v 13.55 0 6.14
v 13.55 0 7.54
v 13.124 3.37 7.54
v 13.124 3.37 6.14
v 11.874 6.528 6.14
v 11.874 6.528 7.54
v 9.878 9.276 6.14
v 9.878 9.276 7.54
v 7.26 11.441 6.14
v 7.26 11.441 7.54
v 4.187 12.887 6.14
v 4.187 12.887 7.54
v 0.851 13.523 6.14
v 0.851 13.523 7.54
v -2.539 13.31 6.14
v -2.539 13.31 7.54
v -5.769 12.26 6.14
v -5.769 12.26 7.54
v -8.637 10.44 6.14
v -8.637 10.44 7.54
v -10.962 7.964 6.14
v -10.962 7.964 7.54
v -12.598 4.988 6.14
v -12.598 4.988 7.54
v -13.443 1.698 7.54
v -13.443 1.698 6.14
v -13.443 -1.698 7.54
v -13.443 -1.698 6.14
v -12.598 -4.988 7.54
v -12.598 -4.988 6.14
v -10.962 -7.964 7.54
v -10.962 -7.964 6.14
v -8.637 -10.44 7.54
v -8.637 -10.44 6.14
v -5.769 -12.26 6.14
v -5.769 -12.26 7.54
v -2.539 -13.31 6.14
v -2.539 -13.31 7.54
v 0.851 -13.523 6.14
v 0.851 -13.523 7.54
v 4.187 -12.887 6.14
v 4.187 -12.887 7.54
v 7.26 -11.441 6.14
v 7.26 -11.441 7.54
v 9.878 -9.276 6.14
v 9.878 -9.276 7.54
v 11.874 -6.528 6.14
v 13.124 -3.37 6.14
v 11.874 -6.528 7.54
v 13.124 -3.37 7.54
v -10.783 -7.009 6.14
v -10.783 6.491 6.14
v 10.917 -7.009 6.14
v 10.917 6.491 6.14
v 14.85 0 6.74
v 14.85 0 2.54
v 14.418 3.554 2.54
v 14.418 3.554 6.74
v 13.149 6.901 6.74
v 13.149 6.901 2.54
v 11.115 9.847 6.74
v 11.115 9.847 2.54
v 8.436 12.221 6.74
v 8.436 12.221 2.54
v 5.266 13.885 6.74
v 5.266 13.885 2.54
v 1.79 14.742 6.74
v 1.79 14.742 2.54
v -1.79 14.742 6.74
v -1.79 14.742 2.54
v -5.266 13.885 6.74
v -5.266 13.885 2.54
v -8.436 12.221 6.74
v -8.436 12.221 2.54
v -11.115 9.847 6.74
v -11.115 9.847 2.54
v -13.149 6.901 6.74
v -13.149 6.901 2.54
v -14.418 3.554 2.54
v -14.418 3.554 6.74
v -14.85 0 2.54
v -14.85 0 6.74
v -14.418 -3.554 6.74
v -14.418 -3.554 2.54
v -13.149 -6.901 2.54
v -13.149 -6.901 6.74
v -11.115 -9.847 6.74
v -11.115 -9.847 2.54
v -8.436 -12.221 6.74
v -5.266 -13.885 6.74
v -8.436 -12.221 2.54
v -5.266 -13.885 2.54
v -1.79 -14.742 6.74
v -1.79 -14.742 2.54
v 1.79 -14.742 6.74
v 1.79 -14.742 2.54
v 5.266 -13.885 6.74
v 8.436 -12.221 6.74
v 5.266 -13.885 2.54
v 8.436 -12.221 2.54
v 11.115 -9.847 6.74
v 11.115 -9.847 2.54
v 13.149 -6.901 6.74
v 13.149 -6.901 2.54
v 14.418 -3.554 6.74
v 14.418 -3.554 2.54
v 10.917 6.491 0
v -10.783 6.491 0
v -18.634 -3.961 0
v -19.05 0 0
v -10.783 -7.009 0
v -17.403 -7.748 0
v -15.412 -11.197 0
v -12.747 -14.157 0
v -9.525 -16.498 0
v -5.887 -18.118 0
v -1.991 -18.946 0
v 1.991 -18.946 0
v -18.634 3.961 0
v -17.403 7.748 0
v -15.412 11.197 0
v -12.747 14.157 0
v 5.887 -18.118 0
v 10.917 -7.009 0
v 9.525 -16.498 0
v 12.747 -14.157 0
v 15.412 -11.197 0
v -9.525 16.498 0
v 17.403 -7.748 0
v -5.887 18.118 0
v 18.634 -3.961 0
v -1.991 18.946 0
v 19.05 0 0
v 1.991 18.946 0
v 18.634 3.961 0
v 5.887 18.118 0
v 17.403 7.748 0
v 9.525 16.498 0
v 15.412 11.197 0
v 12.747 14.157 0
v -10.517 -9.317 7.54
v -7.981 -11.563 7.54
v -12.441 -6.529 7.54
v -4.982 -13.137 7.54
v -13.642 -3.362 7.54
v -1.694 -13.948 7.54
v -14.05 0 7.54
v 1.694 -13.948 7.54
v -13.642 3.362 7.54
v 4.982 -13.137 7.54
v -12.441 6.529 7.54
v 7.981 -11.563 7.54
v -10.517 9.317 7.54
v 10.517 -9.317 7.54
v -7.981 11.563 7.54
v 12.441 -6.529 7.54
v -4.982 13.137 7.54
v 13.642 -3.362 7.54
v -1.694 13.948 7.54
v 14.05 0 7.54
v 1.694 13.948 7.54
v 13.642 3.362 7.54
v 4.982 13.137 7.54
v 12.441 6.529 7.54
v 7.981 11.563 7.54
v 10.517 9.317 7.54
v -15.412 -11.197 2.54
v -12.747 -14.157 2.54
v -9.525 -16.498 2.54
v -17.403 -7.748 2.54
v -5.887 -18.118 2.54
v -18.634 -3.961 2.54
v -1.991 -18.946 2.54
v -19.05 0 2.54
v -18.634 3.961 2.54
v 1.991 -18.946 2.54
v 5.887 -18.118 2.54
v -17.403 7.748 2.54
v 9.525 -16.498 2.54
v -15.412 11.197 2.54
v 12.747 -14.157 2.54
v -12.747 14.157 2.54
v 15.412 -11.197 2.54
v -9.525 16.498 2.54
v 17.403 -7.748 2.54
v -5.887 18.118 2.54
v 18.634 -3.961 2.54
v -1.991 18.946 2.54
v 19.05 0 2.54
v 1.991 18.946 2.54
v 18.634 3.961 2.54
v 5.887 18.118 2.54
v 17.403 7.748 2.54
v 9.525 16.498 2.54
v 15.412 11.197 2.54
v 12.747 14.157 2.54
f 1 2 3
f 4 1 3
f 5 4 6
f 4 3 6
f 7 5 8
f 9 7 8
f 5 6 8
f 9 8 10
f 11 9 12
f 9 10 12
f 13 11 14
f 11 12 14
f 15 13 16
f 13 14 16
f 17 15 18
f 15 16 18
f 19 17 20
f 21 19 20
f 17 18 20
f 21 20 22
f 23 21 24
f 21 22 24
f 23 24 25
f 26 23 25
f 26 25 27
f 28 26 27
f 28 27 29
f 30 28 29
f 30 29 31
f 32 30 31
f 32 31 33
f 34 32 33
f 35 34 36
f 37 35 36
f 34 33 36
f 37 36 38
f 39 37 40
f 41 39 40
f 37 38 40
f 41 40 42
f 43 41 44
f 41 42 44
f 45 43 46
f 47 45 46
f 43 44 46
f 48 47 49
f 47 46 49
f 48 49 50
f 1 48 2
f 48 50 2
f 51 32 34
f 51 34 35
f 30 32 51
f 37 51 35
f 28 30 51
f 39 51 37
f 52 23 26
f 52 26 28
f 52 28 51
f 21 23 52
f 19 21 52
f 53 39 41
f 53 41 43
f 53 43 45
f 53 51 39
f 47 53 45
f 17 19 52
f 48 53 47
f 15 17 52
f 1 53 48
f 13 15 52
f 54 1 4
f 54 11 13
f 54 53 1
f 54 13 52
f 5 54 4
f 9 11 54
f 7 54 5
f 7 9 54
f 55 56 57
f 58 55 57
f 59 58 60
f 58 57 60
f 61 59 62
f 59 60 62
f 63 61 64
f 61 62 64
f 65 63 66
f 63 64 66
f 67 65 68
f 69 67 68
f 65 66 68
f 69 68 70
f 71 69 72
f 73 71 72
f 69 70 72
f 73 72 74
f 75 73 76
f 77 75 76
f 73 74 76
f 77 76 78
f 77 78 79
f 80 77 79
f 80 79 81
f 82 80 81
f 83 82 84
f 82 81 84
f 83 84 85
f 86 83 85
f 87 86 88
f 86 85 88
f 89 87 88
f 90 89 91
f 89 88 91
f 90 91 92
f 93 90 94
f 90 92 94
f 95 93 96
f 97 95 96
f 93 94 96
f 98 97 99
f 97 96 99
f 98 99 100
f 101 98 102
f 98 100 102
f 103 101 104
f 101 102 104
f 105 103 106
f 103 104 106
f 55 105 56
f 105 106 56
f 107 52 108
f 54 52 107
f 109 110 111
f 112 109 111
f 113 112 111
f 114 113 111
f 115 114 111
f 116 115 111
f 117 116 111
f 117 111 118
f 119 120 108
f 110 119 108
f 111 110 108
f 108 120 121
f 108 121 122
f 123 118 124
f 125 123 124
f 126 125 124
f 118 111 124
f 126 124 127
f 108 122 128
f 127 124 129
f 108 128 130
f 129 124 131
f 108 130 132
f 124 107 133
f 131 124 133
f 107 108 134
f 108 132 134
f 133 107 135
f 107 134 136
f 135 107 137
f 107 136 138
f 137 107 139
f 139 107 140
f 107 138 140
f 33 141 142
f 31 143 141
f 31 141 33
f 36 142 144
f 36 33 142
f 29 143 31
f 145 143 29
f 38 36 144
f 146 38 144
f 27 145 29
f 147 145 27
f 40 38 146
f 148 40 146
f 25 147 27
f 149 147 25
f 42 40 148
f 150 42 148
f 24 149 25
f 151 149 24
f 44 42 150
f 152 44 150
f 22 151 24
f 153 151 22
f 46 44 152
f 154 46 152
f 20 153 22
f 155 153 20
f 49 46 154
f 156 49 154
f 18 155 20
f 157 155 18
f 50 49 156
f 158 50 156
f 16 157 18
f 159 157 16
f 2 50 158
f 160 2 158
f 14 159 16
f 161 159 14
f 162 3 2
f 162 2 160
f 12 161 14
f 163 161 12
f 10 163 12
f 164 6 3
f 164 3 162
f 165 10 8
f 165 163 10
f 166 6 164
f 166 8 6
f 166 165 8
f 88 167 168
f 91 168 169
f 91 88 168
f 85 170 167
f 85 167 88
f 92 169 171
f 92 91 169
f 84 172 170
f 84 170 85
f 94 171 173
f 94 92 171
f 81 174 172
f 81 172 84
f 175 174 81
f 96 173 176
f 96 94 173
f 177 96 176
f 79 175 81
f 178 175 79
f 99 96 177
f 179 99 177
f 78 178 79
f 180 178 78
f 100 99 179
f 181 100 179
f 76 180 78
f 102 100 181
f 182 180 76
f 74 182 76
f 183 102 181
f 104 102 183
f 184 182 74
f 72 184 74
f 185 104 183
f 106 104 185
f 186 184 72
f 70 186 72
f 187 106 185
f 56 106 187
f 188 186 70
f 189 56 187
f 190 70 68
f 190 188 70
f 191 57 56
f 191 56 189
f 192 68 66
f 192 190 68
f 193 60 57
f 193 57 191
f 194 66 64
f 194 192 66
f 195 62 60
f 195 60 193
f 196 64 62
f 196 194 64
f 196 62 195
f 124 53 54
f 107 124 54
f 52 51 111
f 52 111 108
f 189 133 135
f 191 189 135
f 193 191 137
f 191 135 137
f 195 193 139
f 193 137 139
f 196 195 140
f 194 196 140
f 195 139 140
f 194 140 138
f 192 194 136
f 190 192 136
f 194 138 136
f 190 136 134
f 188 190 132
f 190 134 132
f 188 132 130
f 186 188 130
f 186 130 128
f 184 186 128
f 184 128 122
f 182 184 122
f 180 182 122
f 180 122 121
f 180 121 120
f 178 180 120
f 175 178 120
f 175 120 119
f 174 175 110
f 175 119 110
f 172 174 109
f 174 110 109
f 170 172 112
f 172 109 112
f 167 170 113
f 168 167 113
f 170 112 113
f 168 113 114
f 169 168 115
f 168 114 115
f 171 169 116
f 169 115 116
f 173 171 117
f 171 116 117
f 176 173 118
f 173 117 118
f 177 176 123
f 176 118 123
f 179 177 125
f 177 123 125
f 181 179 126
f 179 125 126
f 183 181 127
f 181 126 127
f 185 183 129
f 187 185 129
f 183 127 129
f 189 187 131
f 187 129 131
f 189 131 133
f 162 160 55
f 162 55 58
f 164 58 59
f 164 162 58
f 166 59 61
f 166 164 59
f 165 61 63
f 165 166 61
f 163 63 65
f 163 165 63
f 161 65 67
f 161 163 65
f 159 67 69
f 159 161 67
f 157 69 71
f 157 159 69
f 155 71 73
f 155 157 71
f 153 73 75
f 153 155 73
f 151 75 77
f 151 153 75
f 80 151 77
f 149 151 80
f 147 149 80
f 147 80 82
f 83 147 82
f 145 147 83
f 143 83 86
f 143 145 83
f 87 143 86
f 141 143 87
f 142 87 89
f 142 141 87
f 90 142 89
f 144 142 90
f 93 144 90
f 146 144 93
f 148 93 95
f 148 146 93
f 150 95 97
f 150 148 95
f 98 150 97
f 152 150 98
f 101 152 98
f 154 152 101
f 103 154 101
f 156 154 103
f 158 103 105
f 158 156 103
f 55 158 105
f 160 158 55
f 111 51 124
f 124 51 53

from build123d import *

# Parameters (mm, degrees)
F0_R     = 19.05
F1_DEPTH = 2.54
F2_R     = 14.85
F3_DEPTH = 5
F4_W     = 21.7
F4_H     = 13.5
F5_DEPTH = 10
F6_R     = 13.55
F7_DEPTH = 1.4
F8_SIZE  = 0.8


with BuildPart() as f1:
    # F0 (on Top) → F1 (new body)
    with BuildSketch(Plane.XY):
        Circle(F0_R)
    extrude(amount=F1_DEPTH)

    # F2 (on face) → F3 (join)
    with BuildSketch(Plane.XY.offset(2.54)):
        Circle(F2_R)
    extrude(amount=F3_DEPTH)

    # F4 (on face) → F5 (cut)
    with BuildSketch(Plane.XY.offset(7.54)):
        with Locations((0.067133, -0.25862)):
            Rectangle(F4_W, F4_H)
    extrude(amount=-F5_DEPTH, mode=Mode.SUBTRACT)

    # F6 (on face) → F7 (cut)
    with BuildSketch(Plane.XY.offset(7.54)):
        Circle(F6_R)
    extrude(amount=-F7_DEPTH, mode=Mode.SUBTRACT)

    # F8
    f8_edges = [f1.edges().sort_by_distance(p)[0] for p in [
        (-14.85, 0, 7.54),
    ]]
    chamfer(f8_edges, length=F8_SIZE)


solid = f1.part
